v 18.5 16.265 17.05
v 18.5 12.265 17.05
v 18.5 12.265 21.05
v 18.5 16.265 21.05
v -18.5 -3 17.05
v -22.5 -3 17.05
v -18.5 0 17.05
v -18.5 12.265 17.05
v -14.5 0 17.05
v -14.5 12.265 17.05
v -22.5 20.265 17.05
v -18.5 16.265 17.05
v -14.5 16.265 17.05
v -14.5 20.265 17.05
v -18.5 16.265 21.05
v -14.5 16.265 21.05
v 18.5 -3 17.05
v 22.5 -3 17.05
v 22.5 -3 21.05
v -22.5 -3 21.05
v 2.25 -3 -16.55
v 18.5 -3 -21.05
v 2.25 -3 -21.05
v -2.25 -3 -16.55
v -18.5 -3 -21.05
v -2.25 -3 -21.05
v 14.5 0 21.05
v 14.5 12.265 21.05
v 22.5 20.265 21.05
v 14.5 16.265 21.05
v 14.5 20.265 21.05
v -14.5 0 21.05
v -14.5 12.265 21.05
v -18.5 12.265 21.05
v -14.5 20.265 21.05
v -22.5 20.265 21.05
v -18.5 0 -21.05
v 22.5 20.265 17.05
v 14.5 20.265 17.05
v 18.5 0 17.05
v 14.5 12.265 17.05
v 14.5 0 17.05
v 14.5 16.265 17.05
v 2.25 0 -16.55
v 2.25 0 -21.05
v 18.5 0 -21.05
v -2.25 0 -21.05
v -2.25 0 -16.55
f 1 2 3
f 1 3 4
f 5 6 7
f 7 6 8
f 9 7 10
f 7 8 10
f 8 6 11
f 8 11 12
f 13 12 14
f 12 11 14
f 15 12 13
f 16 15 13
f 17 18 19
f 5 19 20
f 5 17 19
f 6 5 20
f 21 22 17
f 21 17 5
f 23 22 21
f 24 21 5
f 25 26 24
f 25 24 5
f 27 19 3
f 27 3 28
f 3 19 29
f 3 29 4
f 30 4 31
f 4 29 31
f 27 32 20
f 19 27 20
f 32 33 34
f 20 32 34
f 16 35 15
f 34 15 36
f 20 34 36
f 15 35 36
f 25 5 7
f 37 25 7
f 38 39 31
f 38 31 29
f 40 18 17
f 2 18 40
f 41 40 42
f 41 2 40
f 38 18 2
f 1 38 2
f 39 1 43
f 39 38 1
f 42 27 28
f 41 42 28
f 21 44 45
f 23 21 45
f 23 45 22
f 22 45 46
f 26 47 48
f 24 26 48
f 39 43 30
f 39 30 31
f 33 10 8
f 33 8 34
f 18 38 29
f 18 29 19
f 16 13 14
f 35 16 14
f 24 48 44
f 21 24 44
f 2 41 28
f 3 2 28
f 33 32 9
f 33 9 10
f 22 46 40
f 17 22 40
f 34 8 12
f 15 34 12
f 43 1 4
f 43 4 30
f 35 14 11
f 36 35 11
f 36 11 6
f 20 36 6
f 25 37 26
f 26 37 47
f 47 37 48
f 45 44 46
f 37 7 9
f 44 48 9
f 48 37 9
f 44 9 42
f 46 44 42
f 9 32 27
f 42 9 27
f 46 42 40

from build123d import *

# Parameters (mm, degrees)
F1_DEPTH = 3
F3_START = -14.5
F2_W     = 12.2653646395
F2_H     = 4
F3_DEPTH = 4
F5_START = 17.05
F5_DEPTH = 4


with BuildPart() as f1:
    # F0 (on Front) → F1 (new body)
    with BuildSketch(Plane.XZ):
        Polygon((18.5, 21.05), (-18.5, 21.05), (-18.5, -21.05), (-2.25, -21.05), (-2.25, -16.55), (2.25, -16.55), (2.25, -21.05), (18.5, -21.05), align=None)
    extrude(amount=F1_DEPTH)

    # F2 (on Right) → F3 (join)
    with BuildSketch(Plane.YZ.offset(F3_START)):
        with Locations((6.1326823197, 19.05)):
            Rectangle(F2_W, F2_H)
    extrude(amount=-F3_DEPTH)

    # F4 (on Top) → F5 (join)
    with BuildSketch(Plane.XY.offset(F5_START)):
        Polygon((-22.5, -3), (-18.5, -3), (-18.5, 16.2653646395), (-14.5, 16.2653646395), (-14.5, 20.2653646395), (-22.5, 20.2653646395), align=None)
    extrude(amount=F5_DEPTH)

    # F6: F1 across plane


with BuildPart() as f1_1:
    add(f1.part)
    add(f1.part.mirror(Plane.YZ))


solid = f1_1.part
